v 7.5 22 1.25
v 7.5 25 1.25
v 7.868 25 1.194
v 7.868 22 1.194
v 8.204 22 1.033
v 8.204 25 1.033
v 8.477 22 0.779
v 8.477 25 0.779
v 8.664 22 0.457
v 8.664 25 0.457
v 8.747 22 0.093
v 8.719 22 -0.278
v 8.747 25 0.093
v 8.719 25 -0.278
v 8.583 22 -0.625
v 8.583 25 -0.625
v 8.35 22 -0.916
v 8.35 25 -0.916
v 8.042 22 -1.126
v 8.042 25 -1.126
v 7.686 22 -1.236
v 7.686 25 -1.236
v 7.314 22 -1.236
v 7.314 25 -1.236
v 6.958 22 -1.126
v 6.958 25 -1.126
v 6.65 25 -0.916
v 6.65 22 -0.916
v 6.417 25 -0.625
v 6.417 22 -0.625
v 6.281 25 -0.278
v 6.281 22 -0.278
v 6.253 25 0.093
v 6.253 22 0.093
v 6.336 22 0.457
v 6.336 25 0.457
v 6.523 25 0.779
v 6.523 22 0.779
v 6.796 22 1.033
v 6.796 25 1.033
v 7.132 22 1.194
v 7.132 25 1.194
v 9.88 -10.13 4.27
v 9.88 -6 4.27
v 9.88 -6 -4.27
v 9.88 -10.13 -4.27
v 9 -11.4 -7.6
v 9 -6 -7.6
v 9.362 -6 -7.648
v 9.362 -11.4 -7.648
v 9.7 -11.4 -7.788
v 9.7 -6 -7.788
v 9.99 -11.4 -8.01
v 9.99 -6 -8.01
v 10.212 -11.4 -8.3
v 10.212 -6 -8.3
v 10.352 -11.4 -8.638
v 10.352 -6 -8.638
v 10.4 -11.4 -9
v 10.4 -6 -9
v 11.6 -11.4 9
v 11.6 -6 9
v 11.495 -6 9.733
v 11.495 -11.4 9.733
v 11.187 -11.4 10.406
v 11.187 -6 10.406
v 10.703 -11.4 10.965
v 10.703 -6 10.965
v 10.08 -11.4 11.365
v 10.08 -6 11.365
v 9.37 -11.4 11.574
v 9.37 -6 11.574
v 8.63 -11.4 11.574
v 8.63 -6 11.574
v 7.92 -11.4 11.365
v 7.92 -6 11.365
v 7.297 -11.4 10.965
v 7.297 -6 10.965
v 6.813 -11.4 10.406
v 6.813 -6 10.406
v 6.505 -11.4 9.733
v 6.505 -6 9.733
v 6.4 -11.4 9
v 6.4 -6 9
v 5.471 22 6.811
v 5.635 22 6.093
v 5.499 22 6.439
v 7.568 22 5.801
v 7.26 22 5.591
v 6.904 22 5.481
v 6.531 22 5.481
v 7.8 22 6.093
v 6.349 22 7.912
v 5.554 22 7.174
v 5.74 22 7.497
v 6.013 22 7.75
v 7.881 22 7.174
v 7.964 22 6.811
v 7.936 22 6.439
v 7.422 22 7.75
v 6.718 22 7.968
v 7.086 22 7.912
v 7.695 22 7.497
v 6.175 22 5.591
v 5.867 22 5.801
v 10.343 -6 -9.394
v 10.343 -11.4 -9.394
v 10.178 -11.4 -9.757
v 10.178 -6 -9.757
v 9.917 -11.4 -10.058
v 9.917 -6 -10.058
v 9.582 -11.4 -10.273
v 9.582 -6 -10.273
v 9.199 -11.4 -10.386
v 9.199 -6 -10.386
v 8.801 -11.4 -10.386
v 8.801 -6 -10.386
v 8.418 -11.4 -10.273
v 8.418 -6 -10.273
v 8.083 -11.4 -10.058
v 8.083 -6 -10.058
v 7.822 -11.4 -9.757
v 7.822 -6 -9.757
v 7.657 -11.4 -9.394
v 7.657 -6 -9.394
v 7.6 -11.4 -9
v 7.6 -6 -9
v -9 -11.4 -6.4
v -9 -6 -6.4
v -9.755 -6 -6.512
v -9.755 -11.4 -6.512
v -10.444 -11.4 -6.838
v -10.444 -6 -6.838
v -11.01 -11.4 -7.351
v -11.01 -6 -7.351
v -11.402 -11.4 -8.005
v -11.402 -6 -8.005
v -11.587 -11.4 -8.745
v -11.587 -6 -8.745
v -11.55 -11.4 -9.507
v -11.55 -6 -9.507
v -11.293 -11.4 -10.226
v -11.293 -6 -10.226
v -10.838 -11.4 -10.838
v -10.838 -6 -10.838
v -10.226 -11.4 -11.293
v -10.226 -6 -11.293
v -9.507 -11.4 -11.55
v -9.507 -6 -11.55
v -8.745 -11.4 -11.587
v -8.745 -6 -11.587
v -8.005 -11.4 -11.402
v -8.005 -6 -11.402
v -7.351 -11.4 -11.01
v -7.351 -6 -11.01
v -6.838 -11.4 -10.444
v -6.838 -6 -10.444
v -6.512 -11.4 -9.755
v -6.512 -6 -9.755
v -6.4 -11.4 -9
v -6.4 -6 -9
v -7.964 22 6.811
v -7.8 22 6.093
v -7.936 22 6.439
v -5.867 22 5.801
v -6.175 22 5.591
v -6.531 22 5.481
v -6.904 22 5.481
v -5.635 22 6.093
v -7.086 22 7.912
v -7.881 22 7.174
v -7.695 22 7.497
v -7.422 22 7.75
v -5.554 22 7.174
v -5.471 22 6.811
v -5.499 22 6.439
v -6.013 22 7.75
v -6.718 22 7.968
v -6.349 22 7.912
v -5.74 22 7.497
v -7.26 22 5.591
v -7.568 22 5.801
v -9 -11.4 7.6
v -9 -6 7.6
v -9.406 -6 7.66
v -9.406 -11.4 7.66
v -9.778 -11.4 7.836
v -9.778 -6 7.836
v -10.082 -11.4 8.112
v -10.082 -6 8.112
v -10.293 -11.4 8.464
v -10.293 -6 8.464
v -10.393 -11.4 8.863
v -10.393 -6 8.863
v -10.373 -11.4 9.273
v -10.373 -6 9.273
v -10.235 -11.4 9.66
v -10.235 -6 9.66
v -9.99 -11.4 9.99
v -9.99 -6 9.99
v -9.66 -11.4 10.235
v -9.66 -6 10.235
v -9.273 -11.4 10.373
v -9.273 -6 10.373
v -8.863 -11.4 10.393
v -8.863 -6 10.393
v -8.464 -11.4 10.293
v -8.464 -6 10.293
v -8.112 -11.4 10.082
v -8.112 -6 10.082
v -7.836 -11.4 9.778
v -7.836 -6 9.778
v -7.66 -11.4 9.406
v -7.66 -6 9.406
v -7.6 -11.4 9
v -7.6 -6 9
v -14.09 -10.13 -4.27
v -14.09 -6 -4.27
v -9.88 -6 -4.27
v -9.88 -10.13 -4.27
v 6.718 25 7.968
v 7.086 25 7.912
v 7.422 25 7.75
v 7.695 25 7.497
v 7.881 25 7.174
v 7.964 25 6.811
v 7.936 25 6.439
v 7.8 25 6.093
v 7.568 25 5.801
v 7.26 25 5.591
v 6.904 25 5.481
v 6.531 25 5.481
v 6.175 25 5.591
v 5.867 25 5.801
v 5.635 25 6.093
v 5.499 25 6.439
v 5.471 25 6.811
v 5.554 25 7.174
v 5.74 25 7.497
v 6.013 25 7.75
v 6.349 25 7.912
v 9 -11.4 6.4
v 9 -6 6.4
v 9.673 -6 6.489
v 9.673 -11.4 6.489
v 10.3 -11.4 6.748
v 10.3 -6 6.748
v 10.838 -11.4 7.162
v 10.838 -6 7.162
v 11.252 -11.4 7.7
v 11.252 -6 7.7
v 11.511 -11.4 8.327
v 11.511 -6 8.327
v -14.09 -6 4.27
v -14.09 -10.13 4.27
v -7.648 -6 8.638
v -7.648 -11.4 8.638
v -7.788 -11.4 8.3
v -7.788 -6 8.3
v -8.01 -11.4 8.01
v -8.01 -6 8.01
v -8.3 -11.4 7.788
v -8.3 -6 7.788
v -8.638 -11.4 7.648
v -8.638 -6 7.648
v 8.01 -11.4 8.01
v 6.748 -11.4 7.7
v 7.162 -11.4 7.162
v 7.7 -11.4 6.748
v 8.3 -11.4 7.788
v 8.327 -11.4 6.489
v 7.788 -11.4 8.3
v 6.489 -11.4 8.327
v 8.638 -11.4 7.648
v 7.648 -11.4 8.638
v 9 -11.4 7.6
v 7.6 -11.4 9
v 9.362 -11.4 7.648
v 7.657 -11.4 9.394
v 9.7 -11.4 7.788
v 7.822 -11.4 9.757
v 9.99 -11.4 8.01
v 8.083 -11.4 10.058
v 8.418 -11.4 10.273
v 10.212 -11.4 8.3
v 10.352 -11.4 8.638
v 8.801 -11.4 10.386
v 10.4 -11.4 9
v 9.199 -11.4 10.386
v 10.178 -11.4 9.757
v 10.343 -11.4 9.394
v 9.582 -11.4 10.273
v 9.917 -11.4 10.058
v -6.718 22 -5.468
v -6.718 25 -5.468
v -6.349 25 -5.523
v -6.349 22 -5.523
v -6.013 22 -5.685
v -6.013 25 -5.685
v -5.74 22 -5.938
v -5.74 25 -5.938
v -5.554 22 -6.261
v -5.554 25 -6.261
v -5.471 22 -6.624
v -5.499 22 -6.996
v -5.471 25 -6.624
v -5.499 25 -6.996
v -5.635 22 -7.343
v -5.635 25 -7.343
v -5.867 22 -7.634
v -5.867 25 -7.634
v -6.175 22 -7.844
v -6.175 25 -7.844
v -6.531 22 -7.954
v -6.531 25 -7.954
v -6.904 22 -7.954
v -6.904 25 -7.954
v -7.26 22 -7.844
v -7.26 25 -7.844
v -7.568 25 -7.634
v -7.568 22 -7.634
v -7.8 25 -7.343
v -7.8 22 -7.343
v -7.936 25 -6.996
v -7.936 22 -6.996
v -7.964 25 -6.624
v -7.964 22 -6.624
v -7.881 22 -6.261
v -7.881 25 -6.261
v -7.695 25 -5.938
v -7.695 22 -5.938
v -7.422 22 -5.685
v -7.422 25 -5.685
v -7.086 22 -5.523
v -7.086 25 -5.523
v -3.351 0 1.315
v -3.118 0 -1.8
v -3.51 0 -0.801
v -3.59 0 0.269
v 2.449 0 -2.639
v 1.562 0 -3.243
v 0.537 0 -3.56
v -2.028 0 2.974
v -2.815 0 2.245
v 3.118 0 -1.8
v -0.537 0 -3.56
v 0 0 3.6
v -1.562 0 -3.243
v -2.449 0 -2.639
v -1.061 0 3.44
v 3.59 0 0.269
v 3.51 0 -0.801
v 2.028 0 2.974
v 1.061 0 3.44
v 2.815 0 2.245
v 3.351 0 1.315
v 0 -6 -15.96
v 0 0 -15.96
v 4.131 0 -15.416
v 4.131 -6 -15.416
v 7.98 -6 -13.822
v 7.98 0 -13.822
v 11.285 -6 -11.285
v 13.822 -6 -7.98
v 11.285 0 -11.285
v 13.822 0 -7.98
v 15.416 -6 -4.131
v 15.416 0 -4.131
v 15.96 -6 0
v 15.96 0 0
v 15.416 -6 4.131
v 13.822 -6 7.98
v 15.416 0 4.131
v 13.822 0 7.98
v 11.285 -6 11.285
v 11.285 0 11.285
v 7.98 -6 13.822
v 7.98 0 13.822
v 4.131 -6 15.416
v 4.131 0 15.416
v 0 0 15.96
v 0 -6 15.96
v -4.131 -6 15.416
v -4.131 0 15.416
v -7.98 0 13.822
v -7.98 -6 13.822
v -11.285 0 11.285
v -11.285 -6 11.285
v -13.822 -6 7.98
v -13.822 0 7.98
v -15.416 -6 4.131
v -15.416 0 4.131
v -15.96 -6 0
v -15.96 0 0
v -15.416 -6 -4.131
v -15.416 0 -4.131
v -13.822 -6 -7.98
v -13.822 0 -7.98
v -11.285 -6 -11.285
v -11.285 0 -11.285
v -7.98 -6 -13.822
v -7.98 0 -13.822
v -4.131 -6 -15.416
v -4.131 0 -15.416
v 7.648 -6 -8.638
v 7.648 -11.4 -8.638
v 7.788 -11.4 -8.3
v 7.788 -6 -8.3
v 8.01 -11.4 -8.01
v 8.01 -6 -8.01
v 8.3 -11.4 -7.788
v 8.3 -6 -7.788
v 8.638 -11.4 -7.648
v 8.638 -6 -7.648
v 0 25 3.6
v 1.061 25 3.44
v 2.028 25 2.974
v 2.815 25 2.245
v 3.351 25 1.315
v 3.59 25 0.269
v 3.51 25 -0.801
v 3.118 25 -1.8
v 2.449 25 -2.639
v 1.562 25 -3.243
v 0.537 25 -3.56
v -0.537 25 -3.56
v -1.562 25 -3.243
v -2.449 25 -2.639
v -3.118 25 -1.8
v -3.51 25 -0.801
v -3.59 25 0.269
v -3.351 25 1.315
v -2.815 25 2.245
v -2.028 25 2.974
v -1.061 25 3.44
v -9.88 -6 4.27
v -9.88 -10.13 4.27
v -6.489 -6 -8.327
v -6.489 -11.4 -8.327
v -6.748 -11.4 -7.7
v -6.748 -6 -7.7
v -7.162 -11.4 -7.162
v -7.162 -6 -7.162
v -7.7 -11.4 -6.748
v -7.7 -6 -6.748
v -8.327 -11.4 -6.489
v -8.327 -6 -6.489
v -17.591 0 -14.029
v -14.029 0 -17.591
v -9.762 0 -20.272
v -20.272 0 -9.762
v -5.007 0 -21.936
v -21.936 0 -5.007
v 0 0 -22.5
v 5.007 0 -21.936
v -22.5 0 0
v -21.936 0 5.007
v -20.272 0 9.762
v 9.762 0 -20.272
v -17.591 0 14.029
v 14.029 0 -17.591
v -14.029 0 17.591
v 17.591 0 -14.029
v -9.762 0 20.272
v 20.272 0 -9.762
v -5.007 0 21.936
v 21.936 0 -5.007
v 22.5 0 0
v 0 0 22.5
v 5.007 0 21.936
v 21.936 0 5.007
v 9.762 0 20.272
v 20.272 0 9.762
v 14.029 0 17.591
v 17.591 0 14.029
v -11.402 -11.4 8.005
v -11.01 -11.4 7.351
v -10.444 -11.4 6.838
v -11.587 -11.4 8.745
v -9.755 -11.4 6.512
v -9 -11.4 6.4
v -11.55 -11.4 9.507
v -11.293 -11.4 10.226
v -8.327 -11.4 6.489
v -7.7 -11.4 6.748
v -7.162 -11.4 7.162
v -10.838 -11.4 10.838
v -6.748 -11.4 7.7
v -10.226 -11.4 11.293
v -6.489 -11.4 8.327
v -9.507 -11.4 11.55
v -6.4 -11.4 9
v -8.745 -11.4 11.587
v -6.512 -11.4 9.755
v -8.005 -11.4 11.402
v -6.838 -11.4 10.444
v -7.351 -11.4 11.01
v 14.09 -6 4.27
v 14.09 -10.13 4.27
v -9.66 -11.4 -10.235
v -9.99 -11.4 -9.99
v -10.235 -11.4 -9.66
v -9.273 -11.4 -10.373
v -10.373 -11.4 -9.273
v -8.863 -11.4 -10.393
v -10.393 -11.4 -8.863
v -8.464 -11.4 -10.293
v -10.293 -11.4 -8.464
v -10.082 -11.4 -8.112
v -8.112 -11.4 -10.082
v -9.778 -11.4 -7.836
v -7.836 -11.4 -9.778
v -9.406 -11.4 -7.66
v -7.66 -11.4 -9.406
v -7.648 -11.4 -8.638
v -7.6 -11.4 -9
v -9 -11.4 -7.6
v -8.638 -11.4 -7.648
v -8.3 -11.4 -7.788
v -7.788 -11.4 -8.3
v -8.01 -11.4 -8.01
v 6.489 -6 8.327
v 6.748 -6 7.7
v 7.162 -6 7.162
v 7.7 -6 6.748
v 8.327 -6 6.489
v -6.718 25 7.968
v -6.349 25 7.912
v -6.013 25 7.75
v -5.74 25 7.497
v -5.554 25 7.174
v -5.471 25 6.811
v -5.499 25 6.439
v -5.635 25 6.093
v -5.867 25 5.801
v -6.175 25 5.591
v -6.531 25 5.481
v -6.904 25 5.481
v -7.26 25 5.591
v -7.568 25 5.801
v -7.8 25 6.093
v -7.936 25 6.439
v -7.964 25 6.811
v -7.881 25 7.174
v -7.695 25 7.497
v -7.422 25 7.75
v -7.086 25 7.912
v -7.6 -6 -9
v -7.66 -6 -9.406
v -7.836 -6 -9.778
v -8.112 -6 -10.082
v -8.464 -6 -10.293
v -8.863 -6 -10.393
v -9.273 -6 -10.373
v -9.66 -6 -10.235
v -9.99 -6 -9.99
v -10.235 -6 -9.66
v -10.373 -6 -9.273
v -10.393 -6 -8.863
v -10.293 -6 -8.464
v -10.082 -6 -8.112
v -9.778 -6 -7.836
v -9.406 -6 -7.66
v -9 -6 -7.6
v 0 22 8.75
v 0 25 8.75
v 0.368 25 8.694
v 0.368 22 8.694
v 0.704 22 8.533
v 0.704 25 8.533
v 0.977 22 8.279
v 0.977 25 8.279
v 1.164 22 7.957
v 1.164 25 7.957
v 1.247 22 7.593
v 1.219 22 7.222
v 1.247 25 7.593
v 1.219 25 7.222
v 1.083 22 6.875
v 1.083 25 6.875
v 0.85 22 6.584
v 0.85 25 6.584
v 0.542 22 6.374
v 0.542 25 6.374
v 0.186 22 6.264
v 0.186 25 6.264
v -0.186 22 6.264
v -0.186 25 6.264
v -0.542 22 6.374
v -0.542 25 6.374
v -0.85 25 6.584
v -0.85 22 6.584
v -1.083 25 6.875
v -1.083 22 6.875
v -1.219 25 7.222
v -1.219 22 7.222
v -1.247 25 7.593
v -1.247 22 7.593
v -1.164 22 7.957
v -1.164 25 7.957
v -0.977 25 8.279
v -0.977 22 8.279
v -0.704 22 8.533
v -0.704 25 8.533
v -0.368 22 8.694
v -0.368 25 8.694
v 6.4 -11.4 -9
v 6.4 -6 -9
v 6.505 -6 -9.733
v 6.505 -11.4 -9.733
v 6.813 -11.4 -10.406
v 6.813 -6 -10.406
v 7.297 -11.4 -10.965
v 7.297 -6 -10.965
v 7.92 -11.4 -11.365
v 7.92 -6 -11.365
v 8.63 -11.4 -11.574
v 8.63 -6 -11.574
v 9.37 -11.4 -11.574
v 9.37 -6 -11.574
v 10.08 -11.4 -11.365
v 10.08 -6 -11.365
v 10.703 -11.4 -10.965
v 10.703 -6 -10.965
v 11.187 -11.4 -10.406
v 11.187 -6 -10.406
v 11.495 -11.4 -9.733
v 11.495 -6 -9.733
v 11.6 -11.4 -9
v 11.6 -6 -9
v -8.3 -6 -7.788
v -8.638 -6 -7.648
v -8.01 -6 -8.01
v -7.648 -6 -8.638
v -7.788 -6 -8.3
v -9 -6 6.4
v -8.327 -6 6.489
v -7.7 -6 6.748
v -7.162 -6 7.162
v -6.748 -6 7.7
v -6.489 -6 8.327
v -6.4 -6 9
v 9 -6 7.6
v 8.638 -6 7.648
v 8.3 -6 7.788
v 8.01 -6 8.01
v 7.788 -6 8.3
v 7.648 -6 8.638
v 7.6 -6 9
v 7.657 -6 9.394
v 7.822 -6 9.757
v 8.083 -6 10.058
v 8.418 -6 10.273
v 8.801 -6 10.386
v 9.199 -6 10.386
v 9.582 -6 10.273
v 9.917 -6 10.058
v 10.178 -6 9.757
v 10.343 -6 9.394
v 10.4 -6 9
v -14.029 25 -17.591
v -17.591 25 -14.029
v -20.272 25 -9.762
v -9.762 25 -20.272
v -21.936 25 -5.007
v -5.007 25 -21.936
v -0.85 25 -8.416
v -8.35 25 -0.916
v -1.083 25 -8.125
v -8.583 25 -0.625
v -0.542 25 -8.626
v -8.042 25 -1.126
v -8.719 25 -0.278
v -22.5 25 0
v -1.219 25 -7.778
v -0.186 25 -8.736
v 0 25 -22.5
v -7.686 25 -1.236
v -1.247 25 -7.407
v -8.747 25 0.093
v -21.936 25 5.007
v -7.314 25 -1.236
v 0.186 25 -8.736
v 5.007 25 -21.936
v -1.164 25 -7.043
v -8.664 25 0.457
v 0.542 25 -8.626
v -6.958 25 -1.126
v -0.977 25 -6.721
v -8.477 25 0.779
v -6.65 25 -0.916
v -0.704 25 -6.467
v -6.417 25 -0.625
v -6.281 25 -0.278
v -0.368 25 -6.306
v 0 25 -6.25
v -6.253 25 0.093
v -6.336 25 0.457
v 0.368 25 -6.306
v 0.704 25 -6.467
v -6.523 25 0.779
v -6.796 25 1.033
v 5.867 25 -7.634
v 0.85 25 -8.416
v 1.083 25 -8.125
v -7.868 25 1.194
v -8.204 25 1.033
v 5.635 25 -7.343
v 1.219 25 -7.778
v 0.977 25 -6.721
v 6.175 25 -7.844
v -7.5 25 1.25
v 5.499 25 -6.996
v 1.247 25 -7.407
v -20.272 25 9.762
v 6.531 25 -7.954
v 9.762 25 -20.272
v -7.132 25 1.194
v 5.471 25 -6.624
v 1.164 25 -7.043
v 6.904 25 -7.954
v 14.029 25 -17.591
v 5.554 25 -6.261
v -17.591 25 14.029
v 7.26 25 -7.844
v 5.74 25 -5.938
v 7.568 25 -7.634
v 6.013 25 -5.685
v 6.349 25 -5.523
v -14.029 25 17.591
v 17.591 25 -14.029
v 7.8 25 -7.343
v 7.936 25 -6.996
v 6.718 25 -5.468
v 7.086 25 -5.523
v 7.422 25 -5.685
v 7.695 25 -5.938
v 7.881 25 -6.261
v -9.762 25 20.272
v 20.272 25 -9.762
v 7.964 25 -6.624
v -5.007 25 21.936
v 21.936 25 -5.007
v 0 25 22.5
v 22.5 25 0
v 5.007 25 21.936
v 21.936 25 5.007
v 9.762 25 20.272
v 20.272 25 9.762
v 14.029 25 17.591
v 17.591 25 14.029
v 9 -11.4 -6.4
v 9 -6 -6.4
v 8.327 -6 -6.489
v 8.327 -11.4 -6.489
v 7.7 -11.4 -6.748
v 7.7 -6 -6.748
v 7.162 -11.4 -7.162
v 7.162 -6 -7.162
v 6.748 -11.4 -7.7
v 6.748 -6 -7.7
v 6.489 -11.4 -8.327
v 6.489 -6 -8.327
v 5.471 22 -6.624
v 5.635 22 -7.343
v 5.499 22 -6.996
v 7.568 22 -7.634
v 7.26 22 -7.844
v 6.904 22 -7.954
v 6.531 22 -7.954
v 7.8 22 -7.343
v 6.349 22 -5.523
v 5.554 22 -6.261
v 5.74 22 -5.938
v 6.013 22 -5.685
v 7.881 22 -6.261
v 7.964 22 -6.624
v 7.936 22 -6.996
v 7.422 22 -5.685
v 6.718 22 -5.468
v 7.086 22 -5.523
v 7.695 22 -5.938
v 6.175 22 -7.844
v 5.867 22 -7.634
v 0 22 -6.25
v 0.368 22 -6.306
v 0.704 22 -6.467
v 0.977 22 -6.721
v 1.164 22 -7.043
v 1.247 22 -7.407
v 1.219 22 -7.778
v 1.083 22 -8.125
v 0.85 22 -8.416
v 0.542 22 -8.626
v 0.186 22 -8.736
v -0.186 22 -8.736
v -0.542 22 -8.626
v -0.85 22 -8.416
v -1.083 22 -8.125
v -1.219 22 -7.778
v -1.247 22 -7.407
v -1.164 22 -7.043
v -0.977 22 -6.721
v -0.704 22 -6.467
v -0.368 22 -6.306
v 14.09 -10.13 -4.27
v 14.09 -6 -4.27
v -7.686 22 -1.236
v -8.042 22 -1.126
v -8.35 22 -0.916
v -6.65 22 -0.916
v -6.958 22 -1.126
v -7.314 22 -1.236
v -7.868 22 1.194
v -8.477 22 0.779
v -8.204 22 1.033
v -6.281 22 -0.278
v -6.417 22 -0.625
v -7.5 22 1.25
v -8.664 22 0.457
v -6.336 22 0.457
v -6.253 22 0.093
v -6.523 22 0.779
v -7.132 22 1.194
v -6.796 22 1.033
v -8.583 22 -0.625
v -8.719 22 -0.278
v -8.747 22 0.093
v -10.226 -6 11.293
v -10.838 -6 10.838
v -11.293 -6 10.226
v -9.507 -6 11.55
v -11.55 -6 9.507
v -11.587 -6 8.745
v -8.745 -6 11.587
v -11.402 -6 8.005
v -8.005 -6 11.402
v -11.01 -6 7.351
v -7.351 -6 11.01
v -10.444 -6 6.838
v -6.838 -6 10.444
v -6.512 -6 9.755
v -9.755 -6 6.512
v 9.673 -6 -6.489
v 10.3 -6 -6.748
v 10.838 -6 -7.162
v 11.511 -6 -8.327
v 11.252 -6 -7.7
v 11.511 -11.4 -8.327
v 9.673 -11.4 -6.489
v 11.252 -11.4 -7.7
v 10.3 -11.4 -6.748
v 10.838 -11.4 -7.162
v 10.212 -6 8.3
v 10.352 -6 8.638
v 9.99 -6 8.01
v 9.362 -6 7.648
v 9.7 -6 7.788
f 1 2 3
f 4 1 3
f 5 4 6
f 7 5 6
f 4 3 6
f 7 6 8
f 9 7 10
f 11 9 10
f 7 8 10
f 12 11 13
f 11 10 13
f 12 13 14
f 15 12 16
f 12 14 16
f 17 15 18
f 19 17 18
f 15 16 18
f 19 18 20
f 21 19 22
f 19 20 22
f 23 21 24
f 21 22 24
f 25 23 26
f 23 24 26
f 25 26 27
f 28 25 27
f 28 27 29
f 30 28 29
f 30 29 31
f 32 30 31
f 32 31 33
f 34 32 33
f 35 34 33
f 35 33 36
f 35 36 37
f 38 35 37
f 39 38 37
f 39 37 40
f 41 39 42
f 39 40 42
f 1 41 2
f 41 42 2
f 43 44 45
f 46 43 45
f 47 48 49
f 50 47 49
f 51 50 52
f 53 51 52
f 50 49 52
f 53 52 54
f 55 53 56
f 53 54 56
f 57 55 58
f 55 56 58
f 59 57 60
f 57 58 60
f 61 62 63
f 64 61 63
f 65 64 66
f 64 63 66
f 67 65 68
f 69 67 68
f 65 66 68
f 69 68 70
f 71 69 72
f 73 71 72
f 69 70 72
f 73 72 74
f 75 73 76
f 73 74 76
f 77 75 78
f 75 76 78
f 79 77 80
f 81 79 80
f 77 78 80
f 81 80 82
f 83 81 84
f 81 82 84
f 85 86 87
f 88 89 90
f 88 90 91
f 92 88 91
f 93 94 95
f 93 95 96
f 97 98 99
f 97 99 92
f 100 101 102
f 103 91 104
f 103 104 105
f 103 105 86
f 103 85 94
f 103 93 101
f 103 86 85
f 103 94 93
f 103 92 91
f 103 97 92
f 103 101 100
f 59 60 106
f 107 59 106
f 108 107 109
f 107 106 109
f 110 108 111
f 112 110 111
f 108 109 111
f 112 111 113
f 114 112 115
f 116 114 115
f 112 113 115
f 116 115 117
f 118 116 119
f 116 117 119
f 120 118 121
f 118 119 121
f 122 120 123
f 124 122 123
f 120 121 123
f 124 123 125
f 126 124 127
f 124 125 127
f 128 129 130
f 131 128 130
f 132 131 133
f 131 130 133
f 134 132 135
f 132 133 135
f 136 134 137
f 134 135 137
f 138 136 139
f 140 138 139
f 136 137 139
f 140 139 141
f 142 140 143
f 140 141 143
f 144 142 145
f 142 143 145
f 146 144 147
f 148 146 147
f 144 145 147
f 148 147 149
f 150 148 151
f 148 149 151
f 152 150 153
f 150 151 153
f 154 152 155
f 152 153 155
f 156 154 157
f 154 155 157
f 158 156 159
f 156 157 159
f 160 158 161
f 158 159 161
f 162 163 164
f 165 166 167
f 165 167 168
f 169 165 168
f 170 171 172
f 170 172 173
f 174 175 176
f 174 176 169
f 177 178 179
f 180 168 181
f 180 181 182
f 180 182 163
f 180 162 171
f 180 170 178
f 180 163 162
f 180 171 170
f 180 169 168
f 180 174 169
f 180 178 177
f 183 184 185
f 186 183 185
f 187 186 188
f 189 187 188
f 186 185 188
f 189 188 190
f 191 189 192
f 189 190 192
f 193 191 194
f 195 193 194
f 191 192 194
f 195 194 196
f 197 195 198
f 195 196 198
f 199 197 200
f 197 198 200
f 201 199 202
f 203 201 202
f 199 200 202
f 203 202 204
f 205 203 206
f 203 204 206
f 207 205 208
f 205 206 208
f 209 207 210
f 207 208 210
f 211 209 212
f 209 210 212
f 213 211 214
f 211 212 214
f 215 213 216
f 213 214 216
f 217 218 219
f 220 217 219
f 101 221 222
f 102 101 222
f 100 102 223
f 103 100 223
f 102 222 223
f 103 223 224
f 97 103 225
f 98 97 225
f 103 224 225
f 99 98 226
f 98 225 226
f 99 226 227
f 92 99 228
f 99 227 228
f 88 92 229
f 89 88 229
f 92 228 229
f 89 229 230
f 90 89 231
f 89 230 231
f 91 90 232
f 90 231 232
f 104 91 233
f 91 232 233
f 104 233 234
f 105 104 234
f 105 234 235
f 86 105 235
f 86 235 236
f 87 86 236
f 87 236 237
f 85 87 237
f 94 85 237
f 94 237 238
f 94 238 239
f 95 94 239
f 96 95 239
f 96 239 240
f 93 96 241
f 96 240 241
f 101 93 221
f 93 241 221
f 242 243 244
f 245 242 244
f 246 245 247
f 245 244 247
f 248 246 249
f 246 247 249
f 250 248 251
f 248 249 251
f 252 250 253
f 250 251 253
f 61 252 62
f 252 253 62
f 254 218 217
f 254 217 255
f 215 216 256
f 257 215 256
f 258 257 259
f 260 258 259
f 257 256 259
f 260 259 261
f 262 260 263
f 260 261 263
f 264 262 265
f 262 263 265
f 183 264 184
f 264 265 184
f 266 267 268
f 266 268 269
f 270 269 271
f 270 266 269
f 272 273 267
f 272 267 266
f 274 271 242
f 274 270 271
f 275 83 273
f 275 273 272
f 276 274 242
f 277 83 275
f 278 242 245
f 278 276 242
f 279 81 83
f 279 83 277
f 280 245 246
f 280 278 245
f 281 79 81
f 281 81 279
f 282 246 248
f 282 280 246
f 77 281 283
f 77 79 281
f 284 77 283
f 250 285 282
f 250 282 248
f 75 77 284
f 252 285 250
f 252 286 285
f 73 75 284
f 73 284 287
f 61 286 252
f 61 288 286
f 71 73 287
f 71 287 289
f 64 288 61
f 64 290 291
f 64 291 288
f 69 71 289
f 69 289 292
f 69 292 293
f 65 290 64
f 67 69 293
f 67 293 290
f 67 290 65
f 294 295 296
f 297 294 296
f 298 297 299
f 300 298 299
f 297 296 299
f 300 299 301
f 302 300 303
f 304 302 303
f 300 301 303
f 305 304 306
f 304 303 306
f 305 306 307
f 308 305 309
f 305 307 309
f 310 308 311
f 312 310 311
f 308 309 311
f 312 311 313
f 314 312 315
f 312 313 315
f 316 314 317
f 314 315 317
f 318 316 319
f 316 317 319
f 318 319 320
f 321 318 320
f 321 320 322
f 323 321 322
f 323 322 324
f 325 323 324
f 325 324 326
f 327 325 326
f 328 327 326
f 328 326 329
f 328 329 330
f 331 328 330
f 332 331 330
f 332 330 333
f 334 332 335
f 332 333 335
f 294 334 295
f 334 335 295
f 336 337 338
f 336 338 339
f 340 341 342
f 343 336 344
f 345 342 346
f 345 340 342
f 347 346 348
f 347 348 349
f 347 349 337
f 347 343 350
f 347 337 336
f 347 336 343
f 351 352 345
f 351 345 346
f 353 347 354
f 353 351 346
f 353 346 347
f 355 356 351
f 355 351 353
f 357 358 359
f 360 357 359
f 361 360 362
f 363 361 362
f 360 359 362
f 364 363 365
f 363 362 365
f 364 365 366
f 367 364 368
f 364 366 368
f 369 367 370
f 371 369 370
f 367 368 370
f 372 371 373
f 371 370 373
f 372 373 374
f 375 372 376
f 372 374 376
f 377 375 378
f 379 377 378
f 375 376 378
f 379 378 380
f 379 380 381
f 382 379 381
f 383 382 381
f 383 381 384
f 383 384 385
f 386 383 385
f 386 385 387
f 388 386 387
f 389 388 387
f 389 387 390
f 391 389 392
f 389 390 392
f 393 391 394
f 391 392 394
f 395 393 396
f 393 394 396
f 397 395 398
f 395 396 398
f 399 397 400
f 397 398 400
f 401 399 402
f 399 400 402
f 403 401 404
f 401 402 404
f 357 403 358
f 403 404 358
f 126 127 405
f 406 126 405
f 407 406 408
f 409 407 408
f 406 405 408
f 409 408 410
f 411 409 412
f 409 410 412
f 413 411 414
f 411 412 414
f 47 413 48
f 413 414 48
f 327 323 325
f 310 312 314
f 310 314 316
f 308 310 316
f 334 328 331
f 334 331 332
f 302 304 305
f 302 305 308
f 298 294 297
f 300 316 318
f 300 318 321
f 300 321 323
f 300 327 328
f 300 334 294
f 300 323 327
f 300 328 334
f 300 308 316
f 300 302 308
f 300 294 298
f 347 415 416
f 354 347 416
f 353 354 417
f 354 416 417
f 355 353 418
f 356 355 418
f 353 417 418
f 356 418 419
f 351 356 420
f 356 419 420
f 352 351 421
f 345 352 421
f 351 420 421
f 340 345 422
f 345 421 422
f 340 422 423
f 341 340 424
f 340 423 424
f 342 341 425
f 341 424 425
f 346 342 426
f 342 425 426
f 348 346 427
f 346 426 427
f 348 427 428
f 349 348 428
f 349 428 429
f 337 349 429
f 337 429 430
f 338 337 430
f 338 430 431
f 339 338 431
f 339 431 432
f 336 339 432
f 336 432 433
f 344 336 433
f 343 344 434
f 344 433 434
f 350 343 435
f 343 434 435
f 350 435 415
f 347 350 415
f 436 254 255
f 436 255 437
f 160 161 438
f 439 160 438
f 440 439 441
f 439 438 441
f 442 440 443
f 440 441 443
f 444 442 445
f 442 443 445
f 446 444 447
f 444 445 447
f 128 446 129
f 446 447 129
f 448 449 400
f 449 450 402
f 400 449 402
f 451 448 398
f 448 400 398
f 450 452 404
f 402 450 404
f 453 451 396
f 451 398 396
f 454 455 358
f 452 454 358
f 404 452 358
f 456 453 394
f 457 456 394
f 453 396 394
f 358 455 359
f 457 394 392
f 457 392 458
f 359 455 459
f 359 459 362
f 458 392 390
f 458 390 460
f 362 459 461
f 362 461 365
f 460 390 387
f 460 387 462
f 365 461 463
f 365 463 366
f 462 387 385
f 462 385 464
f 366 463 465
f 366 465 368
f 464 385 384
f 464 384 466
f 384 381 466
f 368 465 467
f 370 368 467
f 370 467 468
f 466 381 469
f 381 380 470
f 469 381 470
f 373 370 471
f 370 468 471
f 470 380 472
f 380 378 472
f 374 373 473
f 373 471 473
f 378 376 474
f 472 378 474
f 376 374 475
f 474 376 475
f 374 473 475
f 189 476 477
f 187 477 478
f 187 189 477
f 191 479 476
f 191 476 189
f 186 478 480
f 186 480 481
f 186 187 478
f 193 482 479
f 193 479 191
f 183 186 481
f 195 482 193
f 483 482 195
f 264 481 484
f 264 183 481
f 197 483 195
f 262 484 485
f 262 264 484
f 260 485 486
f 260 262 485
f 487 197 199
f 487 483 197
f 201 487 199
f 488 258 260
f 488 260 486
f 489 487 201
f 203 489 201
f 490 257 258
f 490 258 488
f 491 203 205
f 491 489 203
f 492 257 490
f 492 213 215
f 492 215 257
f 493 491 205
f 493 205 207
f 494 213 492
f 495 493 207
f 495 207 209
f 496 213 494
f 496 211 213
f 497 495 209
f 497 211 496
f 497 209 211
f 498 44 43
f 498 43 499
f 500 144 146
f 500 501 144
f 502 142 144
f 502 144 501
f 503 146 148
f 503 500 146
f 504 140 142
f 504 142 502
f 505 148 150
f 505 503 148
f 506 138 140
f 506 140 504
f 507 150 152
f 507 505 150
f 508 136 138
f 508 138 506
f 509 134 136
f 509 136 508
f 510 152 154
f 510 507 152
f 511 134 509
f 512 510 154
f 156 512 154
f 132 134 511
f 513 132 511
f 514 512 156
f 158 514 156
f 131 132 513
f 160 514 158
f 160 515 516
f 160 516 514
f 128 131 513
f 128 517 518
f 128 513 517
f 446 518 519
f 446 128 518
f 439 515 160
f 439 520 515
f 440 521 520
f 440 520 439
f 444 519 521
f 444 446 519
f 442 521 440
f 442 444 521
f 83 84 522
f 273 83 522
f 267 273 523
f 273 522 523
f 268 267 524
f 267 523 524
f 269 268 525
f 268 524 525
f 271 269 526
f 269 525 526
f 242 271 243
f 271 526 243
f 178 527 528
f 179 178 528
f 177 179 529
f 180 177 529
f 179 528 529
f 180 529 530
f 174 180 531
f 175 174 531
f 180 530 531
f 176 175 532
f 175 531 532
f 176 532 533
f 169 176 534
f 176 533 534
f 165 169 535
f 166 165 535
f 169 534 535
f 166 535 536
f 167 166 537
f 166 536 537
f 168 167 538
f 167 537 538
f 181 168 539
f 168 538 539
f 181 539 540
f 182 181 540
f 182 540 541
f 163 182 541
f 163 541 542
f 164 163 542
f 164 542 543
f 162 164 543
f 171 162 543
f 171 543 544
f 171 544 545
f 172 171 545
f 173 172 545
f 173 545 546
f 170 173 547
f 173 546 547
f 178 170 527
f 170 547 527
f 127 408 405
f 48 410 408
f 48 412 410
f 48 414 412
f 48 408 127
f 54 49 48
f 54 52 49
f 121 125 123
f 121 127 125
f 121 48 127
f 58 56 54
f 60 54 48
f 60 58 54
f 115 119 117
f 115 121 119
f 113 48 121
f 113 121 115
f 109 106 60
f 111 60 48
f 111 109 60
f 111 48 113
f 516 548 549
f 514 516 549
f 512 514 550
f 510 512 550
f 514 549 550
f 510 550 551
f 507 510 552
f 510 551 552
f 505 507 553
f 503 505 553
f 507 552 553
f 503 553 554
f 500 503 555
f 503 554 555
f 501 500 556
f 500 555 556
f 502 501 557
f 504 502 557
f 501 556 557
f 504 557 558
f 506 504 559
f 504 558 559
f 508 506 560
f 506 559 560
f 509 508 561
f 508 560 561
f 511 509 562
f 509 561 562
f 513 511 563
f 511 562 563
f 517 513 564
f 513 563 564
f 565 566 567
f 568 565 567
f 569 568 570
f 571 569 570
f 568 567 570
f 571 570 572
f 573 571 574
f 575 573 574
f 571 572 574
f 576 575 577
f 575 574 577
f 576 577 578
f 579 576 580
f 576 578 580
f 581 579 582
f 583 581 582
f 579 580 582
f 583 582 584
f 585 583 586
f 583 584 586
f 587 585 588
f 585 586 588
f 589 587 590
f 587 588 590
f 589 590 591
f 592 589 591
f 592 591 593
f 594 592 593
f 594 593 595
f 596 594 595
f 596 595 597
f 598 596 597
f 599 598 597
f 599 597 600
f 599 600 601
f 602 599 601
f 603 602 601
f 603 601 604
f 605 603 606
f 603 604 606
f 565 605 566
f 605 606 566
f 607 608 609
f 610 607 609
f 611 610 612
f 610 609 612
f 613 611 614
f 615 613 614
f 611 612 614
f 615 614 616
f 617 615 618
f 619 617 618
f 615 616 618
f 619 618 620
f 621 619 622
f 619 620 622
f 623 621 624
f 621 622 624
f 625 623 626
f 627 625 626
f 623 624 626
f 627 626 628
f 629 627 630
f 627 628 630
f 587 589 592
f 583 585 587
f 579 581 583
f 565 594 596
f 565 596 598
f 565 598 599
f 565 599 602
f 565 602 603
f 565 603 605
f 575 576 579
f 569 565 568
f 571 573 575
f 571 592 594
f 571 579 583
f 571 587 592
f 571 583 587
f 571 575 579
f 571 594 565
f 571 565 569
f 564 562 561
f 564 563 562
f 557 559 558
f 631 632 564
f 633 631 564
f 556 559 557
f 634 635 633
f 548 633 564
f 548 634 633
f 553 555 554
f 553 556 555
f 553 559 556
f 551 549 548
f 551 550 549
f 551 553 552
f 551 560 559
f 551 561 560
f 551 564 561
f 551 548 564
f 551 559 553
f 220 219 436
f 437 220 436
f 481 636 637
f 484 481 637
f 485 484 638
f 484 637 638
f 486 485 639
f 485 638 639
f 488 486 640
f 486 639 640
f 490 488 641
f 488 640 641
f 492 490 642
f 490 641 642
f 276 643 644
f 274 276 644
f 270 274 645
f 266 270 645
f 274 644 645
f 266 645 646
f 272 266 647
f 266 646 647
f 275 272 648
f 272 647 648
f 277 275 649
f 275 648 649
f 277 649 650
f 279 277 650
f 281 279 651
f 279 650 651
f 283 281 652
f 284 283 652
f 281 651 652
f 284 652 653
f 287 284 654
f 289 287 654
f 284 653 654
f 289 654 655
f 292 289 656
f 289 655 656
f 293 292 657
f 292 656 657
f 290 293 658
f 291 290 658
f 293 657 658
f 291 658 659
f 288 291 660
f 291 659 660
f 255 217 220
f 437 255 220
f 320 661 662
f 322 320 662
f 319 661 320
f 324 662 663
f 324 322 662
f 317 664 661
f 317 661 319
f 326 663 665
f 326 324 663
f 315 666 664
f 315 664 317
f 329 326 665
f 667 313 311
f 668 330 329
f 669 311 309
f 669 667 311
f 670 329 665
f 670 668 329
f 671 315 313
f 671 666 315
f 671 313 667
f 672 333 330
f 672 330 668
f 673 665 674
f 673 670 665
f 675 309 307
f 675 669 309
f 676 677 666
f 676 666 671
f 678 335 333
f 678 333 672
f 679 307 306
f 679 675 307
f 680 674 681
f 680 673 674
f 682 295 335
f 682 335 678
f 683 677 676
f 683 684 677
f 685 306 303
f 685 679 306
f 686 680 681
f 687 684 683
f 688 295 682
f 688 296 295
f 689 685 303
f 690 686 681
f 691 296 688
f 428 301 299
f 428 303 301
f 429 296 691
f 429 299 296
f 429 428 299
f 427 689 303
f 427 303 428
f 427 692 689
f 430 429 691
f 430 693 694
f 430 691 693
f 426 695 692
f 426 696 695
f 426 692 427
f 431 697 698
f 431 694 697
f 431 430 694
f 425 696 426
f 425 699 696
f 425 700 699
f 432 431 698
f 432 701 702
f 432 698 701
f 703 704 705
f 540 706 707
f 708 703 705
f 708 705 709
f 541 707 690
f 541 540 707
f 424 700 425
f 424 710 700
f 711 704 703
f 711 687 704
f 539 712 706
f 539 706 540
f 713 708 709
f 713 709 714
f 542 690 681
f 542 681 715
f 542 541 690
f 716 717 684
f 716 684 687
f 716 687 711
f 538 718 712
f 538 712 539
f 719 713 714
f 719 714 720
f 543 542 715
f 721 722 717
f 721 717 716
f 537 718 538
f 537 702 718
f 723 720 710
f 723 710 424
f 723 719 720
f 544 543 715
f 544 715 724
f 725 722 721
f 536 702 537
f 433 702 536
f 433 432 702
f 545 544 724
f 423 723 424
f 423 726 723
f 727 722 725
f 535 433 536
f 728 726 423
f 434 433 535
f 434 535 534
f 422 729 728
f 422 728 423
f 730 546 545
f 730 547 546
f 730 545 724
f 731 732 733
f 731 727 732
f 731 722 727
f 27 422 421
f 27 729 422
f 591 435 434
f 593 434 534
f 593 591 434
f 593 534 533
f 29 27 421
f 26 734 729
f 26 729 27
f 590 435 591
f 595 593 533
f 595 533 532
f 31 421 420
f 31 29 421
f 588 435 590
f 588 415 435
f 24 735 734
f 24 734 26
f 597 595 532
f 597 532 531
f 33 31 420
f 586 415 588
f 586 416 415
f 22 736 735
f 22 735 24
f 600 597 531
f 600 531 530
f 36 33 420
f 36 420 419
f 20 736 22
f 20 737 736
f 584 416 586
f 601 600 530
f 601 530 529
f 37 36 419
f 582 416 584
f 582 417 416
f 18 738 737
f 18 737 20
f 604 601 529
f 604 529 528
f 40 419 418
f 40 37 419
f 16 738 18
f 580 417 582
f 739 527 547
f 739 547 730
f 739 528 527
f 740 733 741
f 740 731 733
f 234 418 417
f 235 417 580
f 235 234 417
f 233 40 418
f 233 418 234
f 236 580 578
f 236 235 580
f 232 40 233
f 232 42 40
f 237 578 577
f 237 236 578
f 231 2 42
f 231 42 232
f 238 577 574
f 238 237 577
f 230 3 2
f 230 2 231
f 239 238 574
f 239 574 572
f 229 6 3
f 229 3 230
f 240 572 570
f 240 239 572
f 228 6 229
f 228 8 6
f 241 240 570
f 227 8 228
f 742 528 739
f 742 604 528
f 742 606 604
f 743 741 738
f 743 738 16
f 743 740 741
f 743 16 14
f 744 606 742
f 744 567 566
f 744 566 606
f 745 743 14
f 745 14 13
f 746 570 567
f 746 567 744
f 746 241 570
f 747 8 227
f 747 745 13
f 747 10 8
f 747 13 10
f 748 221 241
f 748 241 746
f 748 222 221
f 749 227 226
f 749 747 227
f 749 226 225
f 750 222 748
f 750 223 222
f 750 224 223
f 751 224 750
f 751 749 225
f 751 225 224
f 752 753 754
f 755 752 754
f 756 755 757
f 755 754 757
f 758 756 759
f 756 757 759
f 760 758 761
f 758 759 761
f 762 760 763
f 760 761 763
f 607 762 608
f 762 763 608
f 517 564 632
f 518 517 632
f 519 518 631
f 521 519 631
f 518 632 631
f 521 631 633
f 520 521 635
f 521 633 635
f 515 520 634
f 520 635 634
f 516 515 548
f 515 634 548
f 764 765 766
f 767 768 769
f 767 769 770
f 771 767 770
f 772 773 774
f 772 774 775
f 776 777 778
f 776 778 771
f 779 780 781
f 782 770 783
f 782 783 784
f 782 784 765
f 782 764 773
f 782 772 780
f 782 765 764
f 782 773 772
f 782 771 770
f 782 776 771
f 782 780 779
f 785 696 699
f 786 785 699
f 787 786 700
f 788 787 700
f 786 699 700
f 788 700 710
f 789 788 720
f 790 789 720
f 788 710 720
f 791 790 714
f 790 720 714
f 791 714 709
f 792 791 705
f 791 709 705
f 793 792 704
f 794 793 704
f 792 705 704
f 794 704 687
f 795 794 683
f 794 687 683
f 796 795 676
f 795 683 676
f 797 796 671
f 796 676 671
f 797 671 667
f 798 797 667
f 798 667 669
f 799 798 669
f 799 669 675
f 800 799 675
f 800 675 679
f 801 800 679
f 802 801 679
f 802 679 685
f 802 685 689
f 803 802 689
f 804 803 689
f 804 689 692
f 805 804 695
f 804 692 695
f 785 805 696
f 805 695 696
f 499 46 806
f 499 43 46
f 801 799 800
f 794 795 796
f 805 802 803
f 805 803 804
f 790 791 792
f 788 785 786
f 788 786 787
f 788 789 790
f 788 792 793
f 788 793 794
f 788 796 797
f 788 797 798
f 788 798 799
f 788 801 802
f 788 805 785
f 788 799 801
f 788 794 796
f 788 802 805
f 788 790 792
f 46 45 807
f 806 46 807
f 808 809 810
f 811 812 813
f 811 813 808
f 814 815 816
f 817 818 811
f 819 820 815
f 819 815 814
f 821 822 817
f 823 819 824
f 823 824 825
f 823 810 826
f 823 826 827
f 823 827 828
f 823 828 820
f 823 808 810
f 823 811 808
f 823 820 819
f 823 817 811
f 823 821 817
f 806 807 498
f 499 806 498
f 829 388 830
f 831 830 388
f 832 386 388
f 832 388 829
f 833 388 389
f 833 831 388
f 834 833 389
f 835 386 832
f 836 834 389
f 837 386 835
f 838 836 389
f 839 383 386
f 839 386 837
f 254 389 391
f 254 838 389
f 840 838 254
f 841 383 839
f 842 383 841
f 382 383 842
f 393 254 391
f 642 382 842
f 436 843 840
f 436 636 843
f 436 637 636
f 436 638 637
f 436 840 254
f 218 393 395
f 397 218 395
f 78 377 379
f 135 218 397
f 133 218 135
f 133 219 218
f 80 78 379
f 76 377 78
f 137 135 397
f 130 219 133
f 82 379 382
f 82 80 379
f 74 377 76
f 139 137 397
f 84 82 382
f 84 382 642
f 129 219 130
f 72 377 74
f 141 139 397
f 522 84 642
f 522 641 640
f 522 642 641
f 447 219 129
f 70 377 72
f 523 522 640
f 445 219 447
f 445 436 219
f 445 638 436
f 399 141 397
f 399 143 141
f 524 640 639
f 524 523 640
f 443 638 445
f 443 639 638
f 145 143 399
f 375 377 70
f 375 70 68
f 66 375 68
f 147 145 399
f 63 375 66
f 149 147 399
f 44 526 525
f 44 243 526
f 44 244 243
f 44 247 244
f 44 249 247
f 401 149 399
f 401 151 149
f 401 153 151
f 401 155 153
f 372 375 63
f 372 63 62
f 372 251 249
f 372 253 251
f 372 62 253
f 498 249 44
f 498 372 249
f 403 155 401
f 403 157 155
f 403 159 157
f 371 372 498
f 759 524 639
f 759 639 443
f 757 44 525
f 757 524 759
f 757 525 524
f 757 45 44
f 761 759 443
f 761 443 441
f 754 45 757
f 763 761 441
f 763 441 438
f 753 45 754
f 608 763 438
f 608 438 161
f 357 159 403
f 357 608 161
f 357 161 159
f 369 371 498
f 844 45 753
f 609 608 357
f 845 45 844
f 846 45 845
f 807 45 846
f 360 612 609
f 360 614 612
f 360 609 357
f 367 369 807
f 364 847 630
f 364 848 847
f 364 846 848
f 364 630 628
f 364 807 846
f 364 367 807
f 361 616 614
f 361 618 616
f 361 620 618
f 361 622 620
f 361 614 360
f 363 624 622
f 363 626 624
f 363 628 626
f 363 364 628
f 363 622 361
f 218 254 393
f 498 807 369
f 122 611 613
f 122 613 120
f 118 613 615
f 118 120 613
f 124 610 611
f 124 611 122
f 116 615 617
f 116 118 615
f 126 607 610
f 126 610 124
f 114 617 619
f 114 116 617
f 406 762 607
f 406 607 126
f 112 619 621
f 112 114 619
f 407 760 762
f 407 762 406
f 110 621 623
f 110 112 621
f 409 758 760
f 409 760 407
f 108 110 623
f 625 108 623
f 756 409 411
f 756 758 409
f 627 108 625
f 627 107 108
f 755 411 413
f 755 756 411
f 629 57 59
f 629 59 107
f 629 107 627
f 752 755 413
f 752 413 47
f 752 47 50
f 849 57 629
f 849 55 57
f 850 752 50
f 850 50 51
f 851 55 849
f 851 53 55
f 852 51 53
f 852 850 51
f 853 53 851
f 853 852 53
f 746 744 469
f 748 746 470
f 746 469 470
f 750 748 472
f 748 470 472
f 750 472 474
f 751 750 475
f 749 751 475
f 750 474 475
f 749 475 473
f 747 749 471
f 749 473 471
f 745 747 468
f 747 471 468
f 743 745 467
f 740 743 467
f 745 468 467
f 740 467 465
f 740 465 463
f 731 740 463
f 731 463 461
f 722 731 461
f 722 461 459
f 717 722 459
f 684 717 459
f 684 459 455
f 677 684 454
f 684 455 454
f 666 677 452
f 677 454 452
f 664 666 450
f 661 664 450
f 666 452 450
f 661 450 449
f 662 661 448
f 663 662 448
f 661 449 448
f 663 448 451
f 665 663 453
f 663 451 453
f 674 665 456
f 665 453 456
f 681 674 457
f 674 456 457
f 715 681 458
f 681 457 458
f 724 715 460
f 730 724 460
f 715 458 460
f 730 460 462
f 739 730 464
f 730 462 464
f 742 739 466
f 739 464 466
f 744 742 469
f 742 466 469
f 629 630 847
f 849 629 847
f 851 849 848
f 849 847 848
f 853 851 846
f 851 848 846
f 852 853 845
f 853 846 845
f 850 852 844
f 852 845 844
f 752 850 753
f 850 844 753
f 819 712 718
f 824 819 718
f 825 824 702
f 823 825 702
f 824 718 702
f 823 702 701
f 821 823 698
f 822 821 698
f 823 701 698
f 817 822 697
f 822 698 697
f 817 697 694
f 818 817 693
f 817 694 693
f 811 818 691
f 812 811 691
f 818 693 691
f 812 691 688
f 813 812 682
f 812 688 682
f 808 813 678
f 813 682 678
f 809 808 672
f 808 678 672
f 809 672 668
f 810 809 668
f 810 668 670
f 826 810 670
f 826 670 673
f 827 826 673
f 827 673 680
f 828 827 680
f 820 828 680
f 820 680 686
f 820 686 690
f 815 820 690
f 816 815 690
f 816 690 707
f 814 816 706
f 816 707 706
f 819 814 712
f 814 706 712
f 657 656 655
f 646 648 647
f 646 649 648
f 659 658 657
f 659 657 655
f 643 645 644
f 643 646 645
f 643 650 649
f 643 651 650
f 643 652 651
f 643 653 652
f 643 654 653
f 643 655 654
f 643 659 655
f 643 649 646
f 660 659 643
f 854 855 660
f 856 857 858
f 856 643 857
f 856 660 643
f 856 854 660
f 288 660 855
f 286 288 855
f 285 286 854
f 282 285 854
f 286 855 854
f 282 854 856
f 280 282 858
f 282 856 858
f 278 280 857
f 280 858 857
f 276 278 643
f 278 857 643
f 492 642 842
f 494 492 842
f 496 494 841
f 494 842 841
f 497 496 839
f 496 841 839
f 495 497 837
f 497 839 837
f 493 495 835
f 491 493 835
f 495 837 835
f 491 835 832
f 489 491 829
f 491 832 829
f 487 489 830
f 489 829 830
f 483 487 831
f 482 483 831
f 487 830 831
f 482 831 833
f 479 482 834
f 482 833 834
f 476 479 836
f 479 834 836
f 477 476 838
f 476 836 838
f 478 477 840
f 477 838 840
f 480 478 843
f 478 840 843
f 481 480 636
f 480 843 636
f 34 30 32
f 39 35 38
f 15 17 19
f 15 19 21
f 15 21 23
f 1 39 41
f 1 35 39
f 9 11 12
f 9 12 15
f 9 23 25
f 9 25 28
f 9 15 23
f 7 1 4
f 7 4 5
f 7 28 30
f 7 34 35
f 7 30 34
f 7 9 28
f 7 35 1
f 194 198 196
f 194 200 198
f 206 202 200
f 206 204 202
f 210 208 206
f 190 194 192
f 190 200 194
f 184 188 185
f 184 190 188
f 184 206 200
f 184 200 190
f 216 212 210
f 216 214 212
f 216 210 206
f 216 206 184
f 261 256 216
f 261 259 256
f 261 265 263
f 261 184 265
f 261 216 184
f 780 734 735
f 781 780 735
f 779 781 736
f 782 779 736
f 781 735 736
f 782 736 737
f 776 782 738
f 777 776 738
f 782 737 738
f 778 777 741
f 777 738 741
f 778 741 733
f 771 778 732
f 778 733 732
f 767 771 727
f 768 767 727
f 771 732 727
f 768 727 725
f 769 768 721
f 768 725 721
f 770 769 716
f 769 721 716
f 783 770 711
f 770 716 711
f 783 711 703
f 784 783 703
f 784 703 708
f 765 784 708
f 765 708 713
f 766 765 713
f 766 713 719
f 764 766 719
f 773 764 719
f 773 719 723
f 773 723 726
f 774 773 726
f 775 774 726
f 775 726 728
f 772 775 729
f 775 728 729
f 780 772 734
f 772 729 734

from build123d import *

# Parameters (mm, degrees)
SKETCH_1_R          = 22.5
EXTRUDE_1_DEPTH     = 25
SKETCH_2_R          = 15.96
EXTRUDE_2_DEPTH     = 6
EXTRUDE_3_DEPTH     = 5.4
SKETCH_4_W          = 4.21
SKETCH_4_H          = 8.54
SKETCH_4_H_2        = 4.27
EXTRUDE_4_DEPTH     = 4.13
SKETCH_5_R          = 1.25
CUT_EXTRUDE_1_DEPTH = 3
SKETCH_6_R          = 3.6
CUT_EXTRUDE_2_DEPTH = 25


with BuildPart() as part:
    # 草图1 → 凸台-拉伸1 (new body)
    with BuildSketch(Plane(origin=(0, 0, 0), x_dir=(1, 0, 0), z_dir=(0, 1, 0))):
        with Locations(Location((0, 0, 0), (0, 0, 270))):
            Circle(SKETCH_1_R)
    extrude(amount=EXTRUDE_1_DEPTH)

    # 草图2 → 凸台-拉伸2 (add)
    with BuildSketch(Plane.XZ):
        with Locations(Location((0, 0, 0), (0, 0, 270))):
            Circle(SKETCH_2_R)
    extrude(amount=EXTRUDE_2_DEPTH)

    # 草图3 → 凸台-拉伸3 (add)
    with BuildSketch(Plane.XZ.offset(6)):
        with BuildLine():
            ThreePointArc((-6.4, 9), (-10.838477631, 10.838477631), (-9, 6.4))
            Line((-9, 6.4), (-9, 7.6))
            ThreePointArc((-9, 7.6), (-9.989949494, 9.989949494), (-7.6, 9))
            Line((-7.6, 9), (-6.4, 9))
        make_face()
        with BuildLine():
            Line((-9, 7.6), (-9, 6.4))
            ThreePointArc((-9, 6.4), (-7.161522369, 7.161522369), (-6.4, 9))
            Line((-6.4, 9), (-7.6, 9))
            ThreePointArc((-7.6, 9), (-8.010050506, 8.010050506), (-9, 7.6))
        make_face()
        with BuildLine():
            ThreePointArc((6.4, 9), (7.161522369, 7.161522369), (9, 6.4))
            Line((9, 6.4), (9, 7.6))
            ThreePointArc((9, 7.6), (8.010050506, 8.010050506), (7.6, 9))
            Line((7.6, 9), (6.4, 9))
        make_face()
        with BuildLine():
            Line((9, 7.6), (9, 6.4))
            ThreePointArc((9, 6.4), (10.838477631, 7.161522369), (11.6, 9))
            ThreePointArc((11.6, 9), (9, 11.6), (6.4, 9))
            Line((6.4, 9), (7.6, 9))
            ThreePointArc((7.6, 9), (9, 10.4), (10.4, 9))
            ThreePointArc((10.4, 9), (9.989949494, 8.010050506), (9, 7.6))
        make_face()
        with BuildLine():
            ThreePointArc((9, -6.4), (7.161522369, -7.161522369), (6.4, -9))
            Line((6.4, -9), (7.6, -9))
            ThreePointArc((7.6, -9), (8.010050506, -8.010050506), (9, -7.6))
            Line((9, -7.6), (9, -6.4))
        make_face()
        with BuildLine():
            Line((7.6, -9), (6.4, -9))
            ThreePointArc((6.4, -9), (9, -11.6), (11.6, -9))
            ThreePointArc((11.6, -9), (10.838477631, -7.161522369), (9, -6.4))
            Line((9, -6.4), (9, -7.6))
            ThreePointArc((9, -7.6), (9.989949494, -8.010050506), (10.4, -9))
            ThreePointArc((10.4, -9), (9, -10.4), (7.6, -9))
        make_face()
        with BuildLine():
            ThreePointArc((-9, -7.6), (-8.010050506, -8.010050506), (-7.6, -9))
            Line((-7.6, -9), (-6.4, -9))
            ThreePointArc((-6.4, -9), (-7.161522369, -7.161522369), (-9, -6.4))
            Line((-9, -6.4), (-9, -7.6))
        make_face()
        with BuildLine():
            Line((-6.4, -9), (-7.6, -9))
            ThreePointArc((-7.6, -9), (-9.989949494, -9.989949494), (-9, -7.6))
            Line((-9, -7.6), (-9, -6.4))
            ThreePointArc((-9, -6.4), (-10.838477631, -10.838477631), (-6.4, -9))
        make_face()
    extrude(amount=EXTRUDE_3_DEPTH)

    # 草图4 → 凸台-拉伸4 (add)
    with BuildSketch(Plane.XZ.offset(6)):
        with Locations((-11.985, 0)):
            Rectangle(SKETCH_4_W, SKETCH_4_H)
        with Locations((11.985, -2.135)):
            Rectangle(SKETCH_4_W, SKETCH_4_H_2)
        with Locations((11.985, 2.135)):
            Rectangle(SKETCH_4_W, SKETCH_4_H_2)
    extrude(amount=EXTRUDE_4_DEPTH)

    # 草图5 → 切除-拉伸1 (cut)
    with BuildSketch(Plane(origin=(0, 25, 0), x_dir=(1, 0, 0), z_dir=(0, 1, 0))):
        with Locations(Location((7.5, 0, 0), (0, 0, 270))):
            Circle(SKETCH_5_R)
        with Locations(Location((-7.5, 0, 0), (0, 0, 270))):
            Circle(SKETCH_5_R)
        with Locations(Location((0, 7.5, 0), (0, 0, 270))):
            Circle(SKETCH_5_R)
        with Locations(Location((0, -7.5, 0), (0, 0, 270))):
            Circle(SKETCH_5_R)
        with Locations(Location((6.717514421, 6.717514421, 0), (0, 0, 270))):
            Circle(SKETCH_5_R)
        with Locations(Location((-6.717514421, -6.717514421, 0), (0, 0, 270))):
            Circle(SKETCH_5_R)
        with Locations(Location((6.717514421, -6.717514421, 0), (0, 0, 270))):
            Circle(SKETCH_5_R)
        with Locations(Location((-6.717514421, 6.717514421, 0), (0, 0, 270))):
            Circle(SKETCH_5_R)
    extrude(amount=-CUT_EXTRUDE_1_DEPTH, mode=Mode.SUBTRACT)

    # 草图6 → 切除-拉伸2 (cut)
    with BuildSketch(Plane(origin=(0, 25, 0), x_dir=(1, 0, 0), z_dir=(0, 1, 0))):
        with Locations(Location((0, 0, 0), (0, 0, 270))):
            Circle(SKETCH_6_R)
    extrude(amount=-CUT_EXTRUDE_2_DEPTH, mode=Mode.SUBTRACT)


solid = part.part
